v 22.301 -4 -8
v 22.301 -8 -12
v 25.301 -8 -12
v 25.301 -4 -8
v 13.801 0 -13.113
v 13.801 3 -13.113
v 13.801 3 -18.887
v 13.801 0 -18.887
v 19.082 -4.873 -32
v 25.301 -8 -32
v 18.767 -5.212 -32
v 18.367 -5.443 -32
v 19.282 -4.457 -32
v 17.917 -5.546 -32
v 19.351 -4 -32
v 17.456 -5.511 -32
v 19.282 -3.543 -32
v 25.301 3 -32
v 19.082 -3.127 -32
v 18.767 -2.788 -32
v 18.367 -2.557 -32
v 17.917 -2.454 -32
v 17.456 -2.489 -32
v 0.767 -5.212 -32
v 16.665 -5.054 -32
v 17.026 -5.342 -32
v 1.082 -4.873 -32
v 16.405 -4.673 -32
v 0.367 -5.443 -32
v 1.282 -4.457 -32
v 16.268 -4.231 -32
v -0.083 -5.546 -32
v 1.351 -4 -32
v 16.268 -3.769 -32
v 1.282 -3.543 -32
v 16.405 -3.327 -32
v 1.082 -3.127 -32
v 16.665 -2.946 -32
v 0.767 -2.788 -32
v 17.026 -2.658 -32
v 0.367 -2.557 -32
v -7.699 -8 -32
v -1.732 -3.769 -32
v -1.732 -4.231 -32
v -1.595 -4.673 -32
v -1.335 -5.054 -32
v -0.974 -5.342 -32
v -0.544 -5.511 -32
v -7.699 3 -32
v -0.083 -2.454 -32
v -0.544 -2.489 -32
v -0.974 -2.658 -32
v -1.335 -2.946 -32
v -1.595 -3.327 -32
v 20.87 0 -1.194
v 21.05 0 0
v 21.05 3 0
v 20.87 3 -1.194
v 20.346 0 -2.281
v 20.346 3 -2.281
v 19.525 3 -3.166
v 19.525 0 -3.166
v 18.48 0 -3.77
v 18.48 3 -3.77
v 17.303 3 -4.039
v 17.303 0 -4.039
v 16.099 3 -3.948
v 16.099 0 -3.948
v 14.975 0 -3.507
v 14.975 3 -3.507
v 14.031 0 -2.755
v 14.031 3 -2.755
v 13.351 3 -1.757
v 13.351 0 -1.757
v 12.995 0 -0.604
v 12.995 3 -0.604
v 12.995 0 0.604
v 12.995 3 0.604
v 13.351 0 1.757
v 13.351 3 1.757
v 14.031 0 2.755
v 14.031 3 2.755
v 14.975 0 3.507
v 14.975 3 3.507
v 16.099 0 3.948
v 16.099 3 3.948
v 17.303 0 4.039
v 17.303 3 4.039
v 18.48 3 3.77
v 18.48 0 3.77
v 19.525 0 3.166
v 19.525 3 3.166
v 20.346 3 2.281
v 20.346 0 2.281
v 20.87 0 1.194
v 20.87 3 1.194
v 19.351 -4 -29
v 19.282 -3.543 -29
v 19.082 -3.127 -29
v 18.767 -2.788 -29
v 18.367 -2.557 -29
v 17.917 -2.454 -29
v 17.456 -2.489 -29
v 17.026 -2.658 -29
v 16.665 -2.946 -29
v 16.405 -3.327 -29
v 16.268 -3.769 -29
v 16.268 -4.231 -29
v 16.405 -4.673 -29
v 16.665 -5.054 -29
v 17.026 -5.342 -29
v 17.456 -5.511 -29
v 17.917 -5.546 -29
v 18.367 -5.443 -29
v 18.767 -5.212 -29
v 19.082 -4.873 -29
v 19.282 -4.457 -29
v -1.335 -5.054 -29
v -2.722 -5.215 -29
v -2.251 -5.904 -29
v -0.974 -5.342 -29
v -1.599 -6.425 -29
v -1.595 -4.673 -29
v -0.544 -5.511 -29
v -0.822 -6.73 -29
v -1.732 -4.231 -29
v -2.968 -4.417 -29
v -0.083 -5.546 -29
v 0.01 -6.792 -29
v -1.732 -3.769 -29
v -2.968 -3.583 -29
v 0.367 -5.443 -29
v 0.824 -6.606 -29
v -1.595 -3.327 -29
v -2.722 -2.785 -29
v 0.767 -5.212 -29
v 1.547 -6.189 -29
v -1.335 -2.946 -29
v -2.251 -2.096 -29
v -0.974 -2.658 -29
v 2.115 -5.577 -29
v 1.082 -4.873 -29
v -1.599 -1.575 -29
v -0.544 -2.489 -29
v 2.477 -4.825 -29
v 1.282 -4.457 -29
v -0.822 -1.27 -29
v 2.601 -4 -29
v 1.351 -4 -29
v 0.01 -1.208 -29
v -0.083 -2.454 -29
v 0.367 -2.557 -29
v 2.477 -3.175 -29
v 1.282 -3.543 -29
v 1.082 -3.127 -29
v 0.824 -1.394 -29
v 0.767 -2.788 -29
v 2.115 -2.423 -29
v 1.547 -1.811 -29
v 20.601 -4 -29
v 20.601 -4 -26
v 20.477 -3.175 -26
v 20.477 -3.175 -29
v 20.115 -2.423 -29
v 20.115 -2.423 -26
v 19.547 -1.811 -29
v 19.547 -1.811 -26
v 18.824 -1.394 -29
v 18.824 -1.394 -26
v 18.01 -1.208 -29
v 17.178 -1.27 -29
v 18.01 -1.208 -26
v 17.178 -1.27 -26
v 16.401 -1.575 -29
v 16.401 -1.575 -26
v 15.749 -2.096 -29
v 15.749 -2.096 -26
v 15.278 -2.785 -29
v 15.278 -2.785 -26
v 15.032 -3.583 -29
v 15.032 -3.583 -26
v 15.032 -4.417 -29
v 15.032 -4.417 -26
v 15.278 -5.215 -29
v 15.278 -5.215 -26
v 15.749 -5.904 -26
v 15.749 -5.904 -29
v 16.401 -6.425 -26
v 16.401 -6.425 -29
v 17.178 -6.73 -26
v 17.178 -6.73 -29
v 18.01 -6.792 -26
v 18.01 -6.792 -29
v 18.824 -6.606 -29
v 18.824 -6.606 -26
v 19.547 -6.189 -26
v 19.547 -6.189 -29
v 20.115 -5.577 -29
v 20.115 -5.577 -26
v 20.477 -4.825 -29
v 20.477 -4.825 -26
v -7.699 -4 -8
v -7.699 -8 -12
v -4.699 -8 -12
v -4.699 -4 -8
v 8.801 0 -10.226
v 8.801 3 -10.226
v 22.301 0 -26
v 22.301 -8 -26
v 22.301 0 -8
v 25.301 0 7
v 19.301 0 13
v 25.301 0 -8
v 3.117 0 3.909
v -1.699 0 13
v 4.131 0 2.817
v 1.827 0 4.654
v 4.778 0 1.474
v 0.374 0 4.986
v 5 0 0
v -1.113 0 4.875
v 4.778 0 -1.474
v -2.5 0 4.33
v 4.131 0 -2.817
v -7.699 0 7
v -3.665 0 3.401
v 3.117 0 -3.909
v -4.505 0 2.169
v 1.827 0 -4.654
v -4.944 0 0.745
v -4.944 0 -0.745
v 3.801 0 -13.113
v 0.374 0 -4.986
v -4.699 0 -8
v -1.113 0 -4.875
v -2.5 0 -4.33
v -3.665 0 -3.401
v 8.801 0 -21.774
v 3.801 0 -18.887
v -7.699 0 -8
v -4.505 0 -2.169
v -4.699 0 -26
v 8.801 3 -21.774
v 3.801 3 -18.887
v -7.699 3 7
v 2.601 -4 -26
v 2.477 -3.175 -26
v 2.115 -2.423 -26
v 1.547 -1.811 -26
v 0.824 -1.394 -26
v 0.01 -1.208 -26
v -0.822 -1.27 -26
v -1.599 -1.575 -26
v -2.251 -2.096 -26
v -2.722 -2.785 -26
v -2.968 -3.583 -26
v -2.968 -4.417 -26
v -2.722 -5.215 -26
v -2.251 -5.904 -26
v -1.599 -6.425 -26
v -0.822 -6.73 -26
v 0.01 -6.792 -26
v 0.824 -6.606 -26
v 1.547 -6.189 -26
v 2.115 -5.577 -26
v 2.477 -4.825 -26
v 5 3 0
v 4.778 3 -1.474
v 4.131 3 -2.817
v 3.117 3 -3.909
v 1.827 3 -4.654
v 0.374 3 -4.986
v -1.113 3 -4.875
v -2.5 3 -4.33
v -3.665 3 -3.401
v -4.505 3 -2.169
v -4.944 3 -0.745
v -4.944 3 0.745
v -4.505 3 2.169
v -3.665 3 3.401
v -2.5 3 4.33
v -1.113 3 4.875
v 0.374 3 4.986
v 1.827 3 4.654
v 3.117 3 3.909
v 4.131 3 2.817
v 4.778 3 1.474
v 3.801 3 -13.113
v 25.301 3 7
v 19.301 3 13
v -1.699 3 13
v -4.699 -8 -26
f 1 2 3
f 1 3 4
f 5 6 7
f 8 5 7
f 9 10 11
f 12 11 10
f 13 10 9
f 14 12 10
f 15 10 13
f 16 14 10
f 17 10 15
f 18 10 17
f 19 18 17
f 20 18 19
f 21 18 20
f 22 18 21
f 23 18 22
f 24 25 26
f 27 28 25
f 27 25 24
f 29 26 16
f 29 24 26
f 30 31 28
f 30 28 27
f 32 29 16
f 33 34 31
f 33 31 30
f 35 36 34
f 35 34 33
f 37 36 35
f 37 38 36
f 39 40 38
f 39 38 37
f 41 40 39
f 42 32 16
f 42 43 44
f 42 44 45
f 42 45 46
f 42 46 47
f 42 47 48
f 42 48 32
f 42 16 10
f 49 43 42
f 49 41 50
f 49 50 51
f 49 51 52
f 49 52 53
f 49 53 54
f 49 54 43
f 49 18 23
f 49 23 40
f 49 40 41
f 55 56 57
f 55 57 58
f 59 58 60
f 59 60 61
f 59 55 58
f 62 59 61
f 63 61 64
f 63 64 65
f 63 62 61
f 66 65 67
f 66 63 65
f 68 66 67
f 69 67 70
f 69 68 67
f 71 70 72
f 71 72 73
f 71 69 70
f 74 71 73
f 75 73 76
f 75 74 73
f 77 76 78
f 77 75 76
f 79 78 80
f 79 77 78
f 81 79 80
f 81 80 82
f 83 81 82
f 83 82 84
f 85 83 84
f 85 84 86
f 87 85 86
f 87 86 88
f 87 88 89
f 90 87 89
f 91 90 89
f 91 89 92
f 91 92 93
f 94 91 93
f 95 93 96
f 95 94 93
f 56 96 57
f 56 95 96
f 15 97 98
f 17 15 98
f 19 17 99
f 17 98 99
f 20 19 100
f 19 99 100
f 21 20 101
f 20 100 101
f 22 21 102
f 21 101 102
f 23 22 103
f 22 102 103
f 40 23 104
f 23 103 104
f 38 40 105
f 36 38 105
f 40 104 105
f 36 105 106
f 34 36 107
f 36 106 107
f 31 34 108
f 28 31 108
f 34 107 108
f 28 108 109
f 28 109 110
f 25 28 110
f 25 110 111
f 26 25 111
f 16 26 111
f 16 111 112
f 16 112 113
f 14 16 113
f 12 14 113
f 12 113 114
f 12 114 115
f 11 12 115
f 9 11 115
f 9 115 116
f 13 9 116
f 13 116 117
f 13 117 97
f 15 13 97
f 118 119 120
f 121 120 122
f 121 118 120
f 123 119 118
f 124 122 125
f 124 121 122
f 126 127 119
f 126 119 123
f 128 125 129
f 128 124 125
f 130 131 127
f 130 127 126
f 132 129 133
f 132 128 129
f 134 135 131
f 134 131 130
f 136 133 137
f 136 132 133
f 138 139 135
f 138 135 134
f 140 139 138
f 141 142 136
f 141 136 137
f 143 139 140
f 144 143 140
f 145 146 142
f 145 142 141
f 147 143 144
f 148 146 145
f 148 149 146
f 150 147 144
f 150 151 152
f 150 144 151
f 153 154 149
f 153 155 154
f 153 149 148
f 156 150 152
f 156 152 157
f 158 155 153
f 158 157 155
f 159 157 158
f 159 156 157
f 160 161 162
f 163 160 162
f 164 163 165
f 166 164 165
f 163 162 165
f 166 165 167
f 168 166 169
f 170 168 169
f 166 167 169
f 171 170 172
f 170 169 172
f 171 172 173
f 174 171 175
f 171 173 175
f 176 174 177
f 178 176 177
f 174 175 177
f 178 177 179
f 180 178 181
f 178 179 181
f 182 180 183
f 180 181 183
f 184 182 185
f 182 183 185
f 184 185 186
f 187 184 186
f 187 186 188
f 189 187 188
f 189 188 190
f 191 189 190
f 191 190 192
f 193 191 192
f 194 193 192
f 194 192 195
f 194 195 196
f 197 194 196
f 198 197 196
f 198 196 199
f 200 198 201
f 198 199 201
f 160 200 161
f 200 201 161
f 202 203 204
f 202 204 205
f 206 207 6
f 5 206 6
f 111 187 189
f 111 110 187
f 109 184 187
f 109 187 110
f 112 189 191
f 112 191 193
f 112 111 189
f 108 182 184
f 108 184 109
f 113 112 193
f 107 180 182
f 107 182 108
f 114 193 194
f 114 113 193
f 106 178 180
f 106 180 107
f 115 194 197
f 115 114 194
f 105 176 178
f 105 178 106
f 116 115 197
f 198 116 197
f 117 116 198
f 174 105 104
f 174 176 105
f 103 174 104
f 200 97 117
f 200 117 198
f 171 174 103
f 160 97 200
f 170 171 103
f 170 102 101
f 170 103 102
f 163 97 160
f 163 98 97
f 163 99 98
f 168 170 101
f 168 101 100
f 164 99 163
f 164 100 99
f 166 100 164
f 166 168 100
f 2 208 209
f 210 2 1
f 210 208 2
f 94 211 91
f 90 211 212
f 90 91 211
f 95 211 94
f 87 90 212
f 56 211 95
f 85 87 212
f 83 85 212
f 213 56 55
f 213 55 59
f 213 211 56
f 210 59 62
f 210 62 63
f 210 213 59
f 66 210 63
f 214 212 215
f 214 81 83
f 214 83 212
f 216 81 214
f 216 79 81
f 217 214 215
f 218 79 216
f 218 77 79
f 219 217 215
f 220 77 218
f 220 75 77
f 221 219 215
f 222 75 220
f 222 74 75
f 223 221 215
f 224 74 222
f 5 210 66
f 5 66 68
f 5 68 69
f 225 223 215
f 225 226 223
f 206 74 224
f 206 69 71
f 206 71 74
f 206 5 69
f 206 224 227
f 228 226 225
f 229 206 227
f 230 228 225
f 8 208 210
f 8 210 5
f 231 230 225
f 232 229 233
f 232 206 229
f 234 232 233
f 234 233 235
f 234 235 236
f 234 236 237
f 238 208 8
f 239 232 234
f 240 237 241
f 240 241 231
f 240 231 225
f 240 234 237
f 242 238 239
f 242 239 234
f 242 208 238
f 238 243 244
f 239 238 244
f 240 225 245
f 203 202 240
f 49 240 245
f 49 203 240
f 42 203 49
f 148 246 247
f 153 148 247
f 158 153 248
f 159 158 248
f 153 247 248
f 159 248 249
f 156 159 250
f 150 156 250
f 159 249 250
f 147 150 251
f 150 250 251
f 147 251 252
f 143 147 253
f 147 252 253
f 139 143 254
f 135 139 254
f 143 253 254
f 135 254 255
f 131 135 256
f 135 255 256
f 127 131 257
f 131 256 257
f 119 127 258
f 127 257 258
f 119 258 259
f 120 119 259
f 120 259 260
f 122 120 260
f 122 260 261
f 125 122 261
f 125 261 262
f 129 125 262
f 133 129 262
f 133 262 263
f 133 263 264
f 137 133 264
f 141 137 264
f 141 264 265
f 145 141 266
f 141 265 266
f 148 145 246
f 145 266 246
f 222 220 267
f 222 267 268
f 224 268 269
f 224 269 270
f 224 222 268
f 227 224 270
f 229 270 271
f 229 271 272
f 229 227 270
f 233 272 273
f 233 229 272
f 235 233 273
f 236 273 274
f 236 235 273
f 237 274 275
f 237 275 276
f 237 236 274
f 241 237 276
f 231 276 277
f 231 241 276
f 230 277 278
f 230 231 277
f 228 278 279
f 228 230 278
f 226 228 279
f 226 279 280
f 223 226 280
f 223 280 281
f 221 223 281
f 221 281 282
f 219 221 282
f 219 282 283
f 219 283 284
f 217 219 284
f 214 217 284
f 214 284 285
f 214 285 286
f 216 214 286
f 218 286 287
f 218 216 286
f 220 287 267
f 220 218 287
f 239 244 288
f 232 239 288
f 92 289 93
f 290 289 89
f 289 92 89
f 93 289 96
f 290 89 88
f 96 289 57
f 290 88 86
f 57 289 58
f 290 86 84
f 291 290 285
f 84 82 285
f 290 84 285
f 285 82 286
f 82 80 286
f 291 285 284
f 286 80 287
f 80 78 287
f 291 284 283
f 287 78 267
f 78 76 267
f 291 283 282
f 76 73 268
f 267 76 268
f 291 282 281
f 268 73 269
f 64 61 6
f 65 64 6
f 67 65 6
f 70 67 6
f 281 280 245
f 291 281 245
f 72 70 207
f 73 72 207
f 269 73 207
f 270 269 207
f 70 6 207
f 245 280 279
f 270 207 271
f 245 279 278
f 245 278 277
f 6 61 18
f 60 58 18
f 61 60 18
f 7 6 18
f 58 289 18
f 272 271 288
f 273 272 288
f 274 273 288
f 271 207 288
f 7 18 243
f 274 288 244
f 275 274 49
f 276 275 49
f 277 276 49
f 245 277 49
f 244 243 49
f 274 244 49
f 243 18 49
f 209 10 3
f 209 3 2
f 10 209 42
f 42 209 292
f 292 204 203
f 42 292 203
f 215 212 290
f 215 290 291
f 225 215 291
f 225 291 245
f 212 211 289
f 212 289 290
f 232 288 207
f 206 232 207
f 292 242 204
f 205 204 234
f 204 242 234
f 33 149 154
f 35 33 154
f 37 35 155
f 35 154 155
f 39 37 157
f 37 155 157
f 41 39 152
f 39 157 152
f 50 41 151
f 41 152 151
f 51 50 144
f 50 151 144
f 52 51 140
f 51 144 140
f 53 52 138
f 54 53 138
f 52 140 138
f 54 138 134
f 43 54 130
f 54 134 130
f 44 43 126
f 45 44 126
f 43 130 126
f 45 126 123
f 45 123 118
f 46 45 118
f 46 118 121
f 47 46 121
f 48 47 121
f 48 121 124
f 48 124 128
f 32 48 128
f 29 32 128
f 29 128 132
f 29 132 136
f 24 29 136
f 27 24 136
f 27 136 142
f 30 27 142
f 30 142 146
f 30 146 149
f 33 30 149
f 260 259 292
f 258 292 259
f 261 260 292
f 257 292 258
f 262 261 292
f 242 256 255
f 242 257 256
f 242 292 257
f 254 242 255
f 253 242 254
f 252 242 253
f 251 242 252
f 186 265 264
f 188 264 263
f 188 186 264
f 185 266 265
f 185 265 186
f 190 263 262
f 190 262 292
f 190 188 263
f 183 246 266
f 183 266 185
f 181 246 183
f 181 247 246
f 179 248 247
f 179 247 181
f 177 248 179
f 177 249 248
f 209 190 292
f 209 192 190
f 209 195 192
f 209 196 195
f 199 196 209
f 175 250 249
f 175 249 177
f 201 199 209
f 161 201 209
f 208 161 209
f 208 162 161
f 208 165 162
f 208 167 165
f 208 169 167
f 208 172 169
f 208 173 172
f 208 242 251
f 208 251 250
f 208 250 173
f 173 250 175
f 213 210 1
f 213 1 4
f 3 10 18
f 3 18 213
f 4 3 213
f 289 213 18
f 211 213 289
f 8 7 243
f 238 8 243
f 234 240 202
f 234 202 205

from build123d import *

# Parameters (mm, degrees)
CROQUIS1_R              = 5
CROQUIS1_R_2            = 4.05
SALIENTE_EXTRUIR1_DEPTH = 3
CROQUIS5_W              = 3
CROQUIS5_H              = 21
SALIENTE_EXTRUIR3_DEPTH = 8
CROQUIS11_W             = 3
CROQUIS11_H             = 21
SALIENTE_EXTRUIR6_DEPTH = 8
CORTAR_EXTRUIR3_DEPTH   = 34
CORTAR_EXTRUIR4_DEPTH   = 3
SALIENTE_EXTRUIR8_DEPTH = 8
CROQUIS15_R             = 1.55
CORTAR_EXTRUIR6_DEPTH   = 7
CROQUIS16_R             = 2.8
CROQUIS16_R_2           = 1.55
CORTAR_EXTRUIR7_DEPTH   = 3


with BuildPart() as part:
    # Croquis1 → Saliente-Extruir1 (new body)
    with BuildSketch(Plane(origin=(0, 0, 0), x_dir=(1, 0, 0), z_dir=(0, 1, 0))):
        Polygon((0, 32), (25.301087099, 32), (25.301087099, -7), (19.301087099, -13), (-1.698912901, -13), (-7.698912901, -7), (-7.698912901, 32), align=None)
        Circle(CROQUIS1_R, mode=Mode.SUBTRACT)
        with Locations((17, 0)):
            Circle(CROQUIS1_R_2, mode=Mode.SUBTRACT)
    extrude(amount=SALIENTE_EXTRUIR1_DEPTH)

    # Croquis5 → Saliente-Extruir3 (add)
    with BuildSketch(Plane.XZ):
        with Locations((-6.198912901, -18.5)):
            Rectangle(CROQUIS5_W, CROQUIS5_H)
    extrude(amount=SALIENTE_EXTRUIR3_DEPTH)

    # Croquis11 → Saliente-Extruir6 (add)
    with BuildSketch(Plane.XZ):
        with Locations((23.801087099, -18.5)):
            Rectangle(CROQUIS11_W, CROQUIS11_H)
    extrude(amount=SALIENTE_EXTRUIR6_DEPTH)

    # Croquis7 → Cortar-Extruir3 (cut, through all)
    with BuildSketch(Plane.ZY.offset(7.698912901)):
        Polygon((-8, -8), (-12, -8), (-8, -4), align=None)
    extrude(amount=-CORTAR_EXTRUIR3_DEPTH, mode=Mode.SUBTRACT)

    # Croquis9 → Cortar-Extruir4 (cut)
    with BuildSketch(Plane(origin=(0, 3, 0), x_dir=(1, 0, 0), z_dir=(0, 1, 0))):
        Polygon((8.801087099, 10.226497308), (13.801087099, 13.113248654), (13.801087099, 18.886751346), (8.801087099, 21.773502692), (3.801087099, 18.886751346), (3.801087099, 13.113248654), align=None)
    extrude(amount=-CORTAR_EXTRUIR4_DEPTH, mode=Mode.SUBTRACT)

    # Croquis13 → Saliente-Extruir8 (add)
    with BuildSketch(Plane.XZ):
        Polygon((-4.698912901, -29), (-4.698912901, -26), (22.301087099, -26), (22.301087099, -29), (25.301087099, -29), (25.301087099, -32), (-7.698912901, -32), (-7.698912901, -29), align=None)
    extrude(amount=SALIENTE_EXTRUIR8_DEPTH)

    # Croquis15 → Cortar-Extruir6 (cut, through all)
    with BuildSketch(Plane.XY.offset(-26)):
        with Locations((-0.198912901, -4)):
            Circle(CROQUIS15_R)
        with Locations((17.801087099, -4)):
            Circle(CROQUIS15_R)
    extrude(amount=-CORTAR_EXTRUIR6_DEPTH, mode=Mode.SUBTRACT)

    # Croquis16 → Cortar-Extruir7 (cut)
    with BuildSketch(Plane.XY.offset(-26)):
        with Locations((-0.198912901, -4)):
            Circle(CROQUIS16_R)
        with Locations((-0.198912901, -4)):
            Circle(CROQUIS16_R_2, mode=Mode.SUBTRACT)
        with Locations((17.801087099, -4)):
            Circle(CROQUIS16_R)
        with Locations((17.801087099, -4)):
            Circle(CROQUIS16_R_2, mode=Mode.SUBTRACT)
    extrude(amount=-CORTAR_EXTRUIR7_DEPTH, mode=Mode.SUBTRACT)


solid = part.part
